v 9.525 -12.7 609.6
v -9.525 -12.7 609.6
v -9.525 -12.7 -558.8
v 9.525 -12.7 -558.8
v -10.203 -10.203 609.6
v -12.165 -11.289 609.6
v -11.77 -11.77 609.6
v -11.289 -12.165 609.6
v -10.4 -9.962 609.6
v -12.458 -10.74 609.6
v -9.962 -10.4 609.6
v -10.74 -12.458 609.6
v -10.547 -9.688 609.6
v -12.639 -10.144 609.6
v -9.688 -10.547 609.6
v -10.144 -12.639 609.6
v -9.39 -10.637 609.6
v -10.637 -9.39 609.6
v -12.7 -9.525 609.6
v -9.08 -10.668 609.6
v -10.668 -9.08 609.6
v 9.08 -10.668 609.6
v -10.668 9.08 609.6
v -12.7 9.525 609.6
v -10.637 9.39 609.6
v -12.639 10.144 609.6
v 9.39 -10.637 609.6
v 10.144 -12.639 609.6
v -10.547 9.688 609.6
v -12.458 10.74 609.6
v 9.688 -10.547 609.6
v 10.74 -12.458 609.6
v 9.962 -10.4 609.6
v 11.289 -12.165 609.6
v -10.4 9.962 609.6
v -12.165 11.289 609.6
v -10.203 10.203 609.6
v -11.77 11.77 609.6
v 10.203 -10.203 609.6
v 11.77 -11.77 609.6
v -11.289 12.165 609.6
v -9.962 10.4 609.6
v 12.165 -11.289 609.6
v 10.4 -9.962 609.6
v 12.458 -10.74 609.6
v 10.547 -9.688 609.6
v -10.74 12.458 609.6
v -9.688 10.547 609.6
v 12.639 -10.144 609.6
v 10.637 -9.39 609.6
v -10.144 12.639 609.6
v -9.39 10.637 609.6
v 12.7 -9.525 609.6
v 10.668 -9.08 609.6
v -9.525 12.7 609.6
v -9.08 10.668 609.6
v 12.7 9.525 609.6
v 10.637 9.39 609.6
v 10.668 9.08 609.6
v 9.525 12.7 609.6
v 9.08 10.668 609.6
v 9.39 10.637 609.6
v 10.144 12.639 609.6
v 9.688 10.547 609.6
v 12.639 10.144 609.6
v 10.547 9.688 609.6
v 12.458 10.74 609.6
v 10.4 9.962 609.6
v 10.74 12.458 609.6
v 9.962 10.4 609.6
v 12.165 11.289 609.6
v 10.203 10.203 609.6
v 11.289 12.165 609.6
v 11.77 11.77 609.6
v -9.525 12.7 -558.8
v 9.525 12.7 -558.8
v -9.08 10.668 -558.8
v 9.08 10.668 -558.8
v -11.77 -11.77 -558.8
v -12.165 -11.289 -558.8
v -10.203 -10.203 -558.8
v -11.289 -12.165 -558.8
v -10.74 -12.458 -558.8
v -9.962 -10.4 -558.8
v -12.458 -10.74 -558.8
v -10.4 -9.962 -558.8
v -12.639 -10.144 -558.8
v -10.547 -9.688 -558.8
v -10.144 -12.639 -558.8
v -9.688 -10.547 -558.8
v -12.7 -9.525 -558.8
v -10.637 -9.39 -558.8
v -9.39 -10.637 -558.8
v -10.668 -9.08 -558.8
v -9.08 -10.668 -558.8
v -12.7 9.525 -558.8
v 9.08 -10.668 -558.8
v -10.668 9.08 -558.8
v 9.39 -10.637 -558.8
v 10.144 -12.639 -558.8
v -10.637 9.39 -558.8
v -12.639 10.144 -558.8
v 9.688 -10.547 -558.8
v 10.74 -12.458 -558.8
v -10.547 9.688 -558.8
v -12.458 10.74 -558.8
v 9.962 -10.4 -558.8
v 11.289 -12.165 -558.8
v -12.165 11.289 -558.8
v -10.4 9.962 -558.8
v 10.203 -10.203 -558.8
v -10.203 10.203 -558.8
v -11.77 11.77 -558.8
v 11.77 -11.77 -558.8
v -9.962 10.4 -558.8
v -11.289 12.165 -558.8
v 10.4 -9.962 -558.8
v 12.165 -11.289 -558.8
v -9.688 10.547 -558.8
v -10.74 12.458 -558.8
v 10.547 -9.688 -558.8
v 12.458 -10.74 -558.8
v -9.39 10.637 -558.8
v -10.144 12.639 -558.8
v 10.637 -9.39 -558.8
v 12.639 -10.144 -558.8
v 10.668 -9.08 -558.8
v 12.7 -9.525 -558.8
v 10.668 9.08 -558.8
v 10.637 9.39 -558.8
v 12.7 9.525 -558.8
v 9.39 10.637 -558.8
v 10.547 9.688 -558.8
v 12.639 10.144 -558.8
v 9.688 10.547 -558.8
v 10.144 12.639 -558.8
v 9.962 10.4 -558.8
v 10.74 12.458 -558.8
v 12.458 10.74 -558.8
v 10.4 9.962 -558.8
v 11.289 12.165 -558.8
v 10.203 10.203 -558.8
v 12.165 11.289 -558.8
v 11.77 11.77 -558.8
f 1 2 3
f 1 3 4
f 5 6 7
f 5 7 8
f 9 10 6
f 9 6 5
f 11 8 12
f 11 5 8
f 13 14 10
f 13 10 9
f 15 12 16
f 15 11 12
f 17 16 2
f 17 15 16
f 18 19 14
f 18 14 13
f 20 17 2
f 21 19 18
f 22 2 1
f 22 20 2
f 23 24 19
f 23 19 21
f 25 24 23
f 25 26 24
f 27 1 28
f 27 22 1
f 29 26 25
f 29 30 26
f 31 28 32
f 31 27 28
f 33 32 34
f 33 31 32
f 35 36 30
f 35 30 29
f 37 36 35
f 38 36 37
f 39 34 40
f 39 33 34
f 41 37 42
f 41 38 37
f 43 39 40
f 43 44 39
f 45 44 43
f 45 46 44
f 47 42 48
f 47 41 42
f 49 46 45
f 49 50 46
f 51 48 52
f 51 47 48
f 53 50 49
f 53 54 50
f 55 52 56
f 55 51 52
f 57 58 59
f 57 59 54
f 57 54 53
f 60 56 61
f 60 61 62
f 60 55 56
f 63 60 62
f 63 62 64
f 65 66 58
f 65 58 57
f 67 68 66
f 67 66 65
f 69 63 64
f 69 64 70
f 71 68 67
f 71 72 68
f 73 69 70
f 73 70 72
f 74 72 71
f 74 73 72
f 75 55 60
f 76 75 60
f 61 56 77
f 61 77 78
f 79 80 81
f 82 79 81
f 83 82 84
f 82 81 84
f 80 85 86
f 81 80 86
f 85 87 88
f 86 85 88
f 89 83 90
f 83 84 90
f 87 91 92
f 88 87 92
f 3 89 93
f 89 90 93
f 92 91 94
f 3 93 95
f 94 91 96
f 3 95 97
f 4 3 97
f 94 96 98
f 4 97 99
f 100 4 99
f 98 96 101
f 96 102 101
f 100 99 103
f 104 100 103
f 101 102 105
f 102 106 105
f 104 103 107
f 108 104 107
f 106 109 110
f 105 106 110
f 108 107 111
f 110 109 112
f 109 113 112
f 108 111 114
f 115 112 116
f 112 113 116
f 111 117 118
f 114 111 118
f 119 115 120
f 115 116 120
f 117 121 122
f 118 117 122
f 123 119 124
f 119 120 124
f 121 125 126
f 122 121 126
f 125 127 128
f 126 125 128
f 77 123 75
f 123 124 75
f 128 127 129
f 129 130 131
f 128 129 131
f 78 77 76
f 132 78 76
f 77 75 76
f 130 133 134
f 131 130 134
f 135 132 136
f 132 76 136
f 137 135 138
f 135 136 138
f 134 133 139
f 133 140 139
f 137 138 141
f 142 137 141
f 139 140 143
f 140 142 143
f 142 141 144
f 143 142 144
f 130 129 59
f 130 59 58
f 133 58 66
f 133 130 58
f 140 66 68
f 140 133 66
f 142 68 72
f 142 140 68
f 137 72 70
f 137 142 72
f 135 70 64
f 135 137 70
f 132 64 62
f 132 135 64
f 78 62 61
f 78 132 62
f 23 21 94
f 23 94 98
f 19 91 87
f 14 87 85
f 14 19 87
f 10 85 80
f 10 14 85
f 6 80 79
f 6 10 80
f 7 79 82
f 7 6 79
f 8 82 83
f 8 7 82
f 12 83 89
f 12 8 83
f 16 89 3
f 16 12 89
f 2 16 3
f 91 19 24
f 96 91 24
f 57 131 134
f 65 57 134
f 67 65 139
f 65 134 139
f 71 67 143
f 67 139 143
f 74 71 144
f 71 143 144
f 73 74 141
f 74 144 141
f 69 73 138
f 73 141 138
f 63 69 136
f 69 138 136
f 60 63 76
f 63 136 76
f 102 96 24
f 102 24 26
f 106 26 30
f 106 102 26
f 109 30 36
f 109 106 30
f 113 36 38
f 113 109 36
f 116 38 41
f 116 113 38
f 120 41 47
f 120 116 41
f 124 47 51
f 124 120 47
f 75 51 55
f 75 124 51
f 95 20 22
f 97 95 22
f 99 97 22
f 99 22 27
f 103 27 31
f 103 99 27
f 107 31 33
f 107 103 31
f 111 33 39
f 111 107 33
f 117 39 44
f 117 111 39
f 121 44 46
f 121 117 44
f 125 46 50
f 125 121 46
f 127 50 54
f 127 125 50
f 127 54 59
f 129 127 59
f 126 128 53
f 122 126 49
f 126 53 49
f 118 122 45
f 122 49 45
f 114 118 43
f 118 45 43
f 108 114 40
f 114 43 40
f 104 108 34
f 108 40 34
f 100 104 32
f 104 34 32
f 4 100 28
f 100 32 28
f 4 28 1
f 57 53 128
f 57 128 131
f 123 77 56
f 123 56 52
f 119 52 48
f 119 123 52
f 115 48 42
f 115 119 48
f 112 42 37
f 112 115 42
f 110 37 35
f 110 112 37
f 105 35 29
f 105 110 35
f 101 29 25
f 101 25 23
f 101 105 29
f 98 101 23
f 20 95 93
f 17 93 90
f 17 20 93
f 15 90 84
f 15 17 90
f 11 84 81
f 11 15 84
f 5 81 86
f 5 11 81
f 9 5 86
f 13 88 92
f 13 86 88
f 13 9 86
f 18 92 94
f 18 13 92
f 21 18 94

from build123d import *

# Parameters (mm, degrees)
SKETCH3_W                = 25.4
SKETCH3_H                = 25.4
SKETCH3_W_2              = 21.336
SKETCH3_H_2              = 21.336
BOSS_EXTRUDE1_DEPTH      = 609.6
BOSS_EXTRUDE1_DEPTH_BACK = 609.6
FILLET1_R                = 3.175
FILLET2_R                = 1.5875
SKETCH4_W                = 25.4
SKETCH4_H                = 50.8
CUT_EXTRUDE1_DEPTH       = 26.4


with BuildPart() as part:
    # Sketch3 → Boss-Extrude1 (new body, two sides)
    with BuildSketch(Plane.XY) as boss_extrude1_sk:
        Rectangle(SKETCH3_W, SKETCH3_H)
        Rectangle(SKETCH3_W_2, SKETCH3_H_2, mode=Mode.SUBTRACT)
    extrude(amount=BOSS_EXTRUDE1_DEPTH)
    extrude(boss_extrude1_sk.sketch, amount=-BOSS_EXTRUDE1_DEPTH_BACK)

    # Fillet1
    fillet1_edges = [part.edges().sort_by_distance(p)[0] for p in [
        (12.7, -12.7, 0),
        (-12.7, -12.7, 0),
        (-12.7, 12.7, 0),
        (12.7, 12.7, 0),
    ]]
    fillet(fillet1_edges, radius=FILLET1_R)

    # Fillet2
    fillet2_edges = [part.edges().sort_by_distance(p)[0] for p in [
        (10.668, -10.668, 0),
        (10.668, 10.668, 0),
        (-10.668, 10.668, 0),
        (-10.668, -10.668, 0),
    ]]
    fillet(fillet2_edges, radius=FILLET2_R)

    # Sketch4 → Cut-Extrude1 (cut, through all)
    with BuildSketch(Plane(origin=(0, 12.7, 0), x_dir=(1, 0, 0), z_dir=(0, 1, 0))):
        with Locations((0, 584.2)):
            Rectangle(SKETCH4_W, SKETCH4_H)
    extrude(amount=-CUT_EXTRUDE1_DEPTH, mode=Mode.SUBTRACT)


solid = part.part
